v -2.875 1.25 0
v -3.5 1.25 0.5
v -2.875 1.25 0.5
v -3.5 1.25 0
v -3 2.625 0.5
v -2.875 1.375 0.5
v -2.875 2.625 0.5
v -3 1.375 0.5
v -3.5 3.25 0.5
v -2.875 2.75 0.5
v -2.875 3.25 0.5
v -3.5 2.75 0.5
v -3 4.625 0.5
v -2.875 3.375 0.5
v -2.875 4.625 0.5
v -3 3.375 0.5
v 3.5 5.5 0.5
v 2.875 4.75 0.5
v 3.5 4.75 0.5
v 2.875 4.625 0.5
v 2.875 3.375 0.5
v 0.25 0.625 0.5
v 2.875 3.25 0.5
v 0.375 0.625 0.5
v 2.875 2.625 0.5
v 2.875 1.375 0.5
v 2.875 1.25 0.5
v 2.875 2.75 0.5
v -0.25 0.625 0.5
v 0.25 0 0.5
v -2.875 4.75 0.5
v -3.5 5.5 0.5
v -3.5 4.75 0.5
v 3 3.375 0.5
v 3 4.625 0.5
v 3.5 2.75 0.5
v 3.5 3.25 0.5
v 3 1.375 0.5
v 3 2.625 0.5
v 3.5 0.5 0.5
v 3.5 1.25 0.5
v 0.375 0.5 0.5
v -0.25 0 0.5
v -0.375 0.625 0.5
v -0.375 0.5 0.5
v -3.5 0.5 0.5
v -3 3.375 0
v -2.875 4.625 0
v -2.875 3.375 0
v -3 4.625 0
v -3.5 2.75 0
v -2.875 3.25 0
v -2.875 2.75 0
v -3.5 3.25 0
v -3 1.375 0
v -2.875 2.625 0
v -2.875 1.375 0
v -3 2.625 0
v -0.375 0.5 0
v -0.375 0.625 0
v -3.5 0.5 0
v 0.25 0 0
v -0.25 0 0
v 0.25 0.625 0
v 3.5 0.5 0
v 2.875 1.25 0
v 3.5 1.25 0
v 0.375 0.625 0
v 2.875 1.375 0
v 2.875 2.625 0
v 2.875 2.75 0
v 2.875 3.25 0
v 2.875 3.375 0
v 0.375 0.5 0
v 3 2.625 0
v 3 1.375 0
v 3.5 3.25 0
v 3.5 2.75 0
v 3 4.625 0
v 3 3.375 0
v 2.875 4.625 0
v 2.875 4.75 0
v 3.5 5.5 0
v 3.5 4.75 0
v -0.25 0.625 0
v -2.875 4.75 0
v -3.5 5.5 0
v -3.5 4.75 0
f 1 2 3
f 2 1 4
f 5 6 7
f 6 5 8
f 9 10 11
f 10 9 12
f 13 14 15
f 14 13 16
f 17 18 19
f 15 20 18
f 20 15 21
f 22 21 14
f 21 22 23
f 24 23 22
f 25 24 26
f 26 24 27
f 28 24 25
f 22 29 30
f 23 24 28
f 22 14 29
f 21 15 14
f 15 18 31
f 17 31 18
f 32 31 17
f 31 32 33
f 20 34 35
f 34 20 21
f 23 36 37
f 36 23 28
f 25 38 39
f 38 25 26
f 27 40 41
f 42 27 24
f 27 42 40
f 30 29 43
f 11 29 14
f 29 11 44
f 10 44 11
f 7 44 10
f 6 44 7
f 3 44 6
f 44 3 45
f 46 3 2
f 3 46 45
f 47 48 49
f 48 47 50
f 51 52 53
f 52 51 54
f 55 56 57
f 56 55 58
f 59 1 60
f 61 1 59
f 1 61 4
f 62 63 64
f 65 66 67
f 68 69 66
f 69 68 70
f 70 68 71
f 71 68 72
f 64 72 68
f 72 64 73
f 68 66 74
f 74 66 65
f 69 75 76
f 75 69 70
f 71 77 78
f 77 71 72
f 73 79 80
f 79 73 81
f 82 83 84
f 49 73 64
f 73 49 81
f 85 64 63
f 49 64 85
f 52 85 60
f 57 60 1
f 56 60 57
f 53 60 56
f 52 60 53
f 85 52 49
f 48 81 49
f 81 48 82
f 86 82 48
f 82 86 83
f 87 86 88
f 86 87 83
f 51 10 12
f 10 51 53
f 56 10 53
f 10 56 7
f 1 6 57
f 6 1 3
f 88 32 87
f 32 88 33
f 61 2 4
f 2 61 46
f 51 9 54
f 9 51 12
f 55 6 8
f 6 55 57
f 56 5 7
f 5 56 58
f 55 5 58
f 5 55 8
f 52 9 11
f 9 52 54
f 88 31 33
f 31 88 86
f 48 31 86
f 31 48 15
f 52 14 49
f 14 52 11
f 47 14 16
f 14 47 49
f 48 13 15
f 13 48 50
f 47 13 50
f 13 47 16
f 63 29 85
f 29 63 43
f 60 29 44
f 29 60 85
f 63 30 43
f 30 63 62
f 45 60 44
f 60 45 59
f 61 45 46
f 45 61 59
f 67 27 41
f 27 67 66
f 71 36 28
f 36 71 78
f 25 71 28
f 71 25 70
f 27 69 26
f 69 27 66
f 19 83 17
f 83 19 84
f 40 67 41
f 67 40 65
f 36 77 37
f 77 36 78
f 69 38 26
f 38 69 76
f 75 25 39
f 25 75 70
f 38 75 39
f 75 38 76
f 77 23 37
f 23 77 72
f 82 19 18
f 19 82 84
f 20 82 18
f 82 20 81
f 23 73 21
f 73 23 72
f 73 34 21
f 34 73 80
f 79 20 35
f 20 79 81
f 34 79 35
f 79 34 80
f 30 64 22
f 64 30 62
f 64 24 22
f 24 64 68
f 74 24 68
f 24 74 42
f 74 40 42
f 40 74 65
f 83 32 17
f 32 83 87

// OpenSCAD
// file: modus.scad
//Corner Joint - allows the sides of two parts to create inlayed corner. Aids with welding.
//need to verify module math is the same throughout all parts.

module cornerjoint(Z,L,H,EndGap,PadL,PadH,CJangle,CJcenter){
    //change so that H = Z of inlayed part (usually 0.5)
    //add center and angle in degrees option, orgin far side of cut out area

     if((CJangle==0)&&(CJcenter==0))
      {    
        translate([0,0,0])
        rotate([0,0,CJangle])
        difference(){
        cube([L,H+PadH,Z]);
        translate([EndGap,H,0])
        cube([PadL,PadH,Z]);
        translate([L-EndGap-PadL,H,0])
        cube([PadL,PadH,Z]);}
      }    
else if((CJangle==90)&&(CJcenter==0))
      {    
        translate([H+PadH,0,0])
        rotate([0,0,CJangle])
        difference(){
        cube([L,H+PadH,Z]);
        translate([EndGap,H,0])
        cube([PadL,PadH,Z]);
        translate([L-EndGap-PadL,H,0])
        cube([PadL,PadH,Z]);}
      }
else if((CJangle==180)&&(CJcenter==0))       
      {    
        translate([L,H+PadH,0])
        rotate([0,0,CJangle])
        difference(){
        cube([L,H+PadH,Z]);
        translate([EndGap,H,0])
        cube([PadL,PadH,Z]);
        translate([L-EndGap-PadL,H,0])
        cube([PadL,PadH,Z]);}
      }
else if((CJangle==270)&&(CJcenter==0))
      {    
        translate([0,L,0])
        rotate([0,0,CJangle])
        difference(){
        cube([L,H+PadH,Z]);
        translate([EndGap,H,0])
        cube([PadL,PadH,Z]);
        translate([L-EndGap-PadL,H,0])
        cube([PadL,PadH,Z]);}
      }  
      
//centered     
   
else if((CJangle==0)&&(CJcenter==1))
      {    
        translate([-L/2,0,0])
        rotate([0,0,CJangle])
        difference(){
        cube([L,H+PadH,Z]);
        translate([EndGap,H,0])
        cube([PadL,PadH,Z]);
        translate([L-EndGap-PadL,H,0])
        cube([PadL,PadH,Z]);}
      }  
else if((CJangle==90)&&(CJcenter==1))
      {    
        translate([0,-L/2,0])
        rotate([0,0,CJangle])
        difference(){
        cube([L,H+PadH,Z]);
        translate([EndGap,H,0])
        cube([PadL,PadH,Z]);
        translate([L-EndGap-PadL,H,0])
        cube([PadL,PadH,Z]);}
      }
else if((CJangle==180)&&(CJcenter==1))       
      {    
        translate([L/2,0,0])
        rotate([0,0,CJangle])
        difference(){
        cube([L,H+PadH,Z]);
        translate([EndGap,H,0])
        cube([PadL,PadH,Z]);
        translate([L-EndGap-PadL,H,0])
        cube([PadL,PadH,Z]);}
      }
else if((CJangle==270)&&(CJcenter==1))
      {    
        translate([0,L/2,0])
        rotate([0,0,CJangle])
        difference(){
        cube([L,H+PadH,Z]);
        translate([EndGap,H,0])
        cube([PadL,PadH,Z]);
        translate([L-EndGap-PadL,H,0])
        cube([PadL,PadH,Z]);}
      }
} //end cornerjoint module

//Tab Insert - used to cut a hole for an abutting part to insert into. Typically aids with welding the two parts.
module tabinsert(X,Y,Z,dGap,cGap,c1,c2,c3,c4,c5,c6,c7,c8,center){
    translate([-dGap-(center*(X/2)),-dGap-(center*(Y/2)),0]){
        //main cut
        cube([X+(dGap*2),Y+(dGap*2),Z]);
        //corner c1c2
        translate([-cGap,(Y+(dGap*2))-c1+cGap,0])
            {
        cube([c2,c1,Z]);}
       //corner c3c4
       translate([(X+(dGap*2))-c3+cGap,(Y+(dGap*2))-c4+cGap,0]){
           cube([c3,c4,Z]);
       }
       //corner c5c6
       translate([(X+(dGap*2))-c6+cGap,-cGap,0])
      {
          cube([c6,c5,Z]);
      }
       
       //corner c7c8 
       translate([-cGap,-cGap,0]){
           cube([c7,c8,Z]);
       }
    
    } //end center translate
} //end tabinsert module
 
// file: vars.scad
brickW=6; 
brickL=12;
brickCH=6;

$fn=8; //defines resolution of circles. 8 is okay for review. 100  or greater should be used for for final dxf export.

dZstandard=0.5; //thickness of steel to be cut for drawer parts
fZstandard=0.5;
aZstandard=0.5; //thickness of steel to be cut for arm parts

fBOLTHOLEstandardD=1; //standard bolts used on frame
sliderodholeOD=1.2; 

dGap=0.03125; //gap between a hole cut's edge and the part sitting within the hole. //D3 appears to use 0.3125, is this in error?

//all parts set to standard thickness below
//off standard preferences can be defined below

//drawer
drawergap=0.0283;  //extra room for drawer to slide in the space between f1 and f4
drawerHgap=0.1884;  //total extra space from drawer sides to frame walls. sum of both sides.

d1z=dZstandard;
d2z=dZstandard;
d3z=dZstandard;
d4z=dZstandard;
d5z=dZstandard;
d6z=dZstandard;
d5z=dZstandard;
d7z=dZstandard;
d8z=dZstandard;
d9z=dZstandard;

//frame
f1x=24.2;
f1y=6;
f1z=0.5;


f2y=3.5;
f2z=fZstandard;

f3x=f1x;
f3y=3.5;
f3z=fZstandard;

f4y=11;
f4z=fZstandard;

f5y=3.5;
f5z=fZstandard;

f6y=8;
f6z=fZstandard;

f8y=brickW;
f8z=fZstandard;
f8boltD=1;

f9y=4.5;
f9x=43.5;  //set based on MAINcylinder
f9z=fZstandard;

f8x=f9x;

f11x=1.25;
f11z=fZstandard;

f13z=fZstandard;

//arms

a1x=4;
a1y=72; //calculate based on drawer cylinder
a1z=aZstandard;

a2x=6;
a2y=72;  //calculate based on drawer cylinder
a2z=aZstandard;

a4z=aZstandard;
a6z=aZstandard;

//
//Input your main cylinder's dimenions here
//
cylinderMAINminC2E=0; //main hydraulic cylinder's distance from center of mounting hole to the end of the shaft when fully compressed.
cylinderMAINmaxC2E=0; //main hydraulic cylinder's distance from center of mounting hole to the end of the shaft when fully extended.

//
//Input your drawer cylinder's dimenions here
//
cylinderDRAWERbodyH=3; //measured when in position, largest length from top to bottom of cylinder
cylinderDRAWERminC2C=0; //drawer's hydraulic cylinder's distance from the center of one mounting hole to the center of the other when fully compressed.
cylinderDRAWERmaxC2C=0; ///drawer's hydraulic cylinder's distance from the center of one mounting hole to the center of the other when fully extended.
cylinderDRAWERrodclevisW=2.5; //width of cylinders' clevis on end of rod
cylinderDRAWERrodclevisID=1;
cylinderDRAWERrodclevisOD=2;
cylinderDRAWERrearclevisW=2.5; //width of mounting clevis cylinder body
cylinderDRAWERrearclevisID=1;
cylinderDRAWERrearclevisOD=2;
cylinderDRAWERrearclevisClearance=3; //usable space around rear clevis pin (in diameter). be aware of hyraulic fittings.

//the following variables are calculated in order of dependence on preceding variables
d3x=brickL+(d2z*2);
d3y=brickCH-d1z;
d4x=brickW+d3z+d3z;
d4y=brickCH-d1z;
d5x=brickL+(d2z*2);
d5y=brickW;
d6x=brickL+(d2z*2);
d6y=brickCH;
d7x=cylinderDRAWERrearclevisClearance;
d7y=a4z+d8z+cylinderDRAWERbodyH;
d9x=cylinderDRAWERbodyH+d6z;
d9y=cylinderDRAWERbodyH+d8z;
d8x=brickL+(d2z*2);
d8y=max(5,(d9x-d6z));   //need to review fundamentals, 5 minimun unless d9 gets larger than d8
d1x=18.5;   //need to come up with a formula
d1y=18;     //need to come up with a formula
d2x=d8y+d6z+brickW+d3z+d5y+d3z;
d2y=brickCH;

f11y=f8y;
f6x=brickL+(d2z*2)+(f9y*2)+drawerHgap;
f8x=43.5;  //need to define based on MAINcylinder inputs


f2x=brickL+(d2z*2)+drawerHgap+(f9y*2)-(1.4*2);  //distance between large cut outs in f9

f5x=brickL+(d2z*2)+drawerHgap+(f9y*2)+(a1x*2); //distance between outer edges of each A1

f4x=f5x-0.5;   //same as f5 but minus 0.25 on each side to give a little overhang
// main file
include <vars.scad>;
use <modus.scad>;

d4p();

module d4p(){

difference(){
translate([-(d4x/2),0,0])
cube([d4x,d4y,d4z]);
translate([-(d4x/2),0,0])
cuts();
translate([(d4x/2),0,0])
mirror([1,0,0])
cuts();
} //end difference
module cuts(){
    translate([0,d5z+0.75,0])
    cornerjoint(d4z,(d4y-(0.75*2)-0.5-d5z)/2,d3z,0.125,((d4y-(0.75*2)-0.5-d5z)/2)-(0.125*2),0.125,270,0);
    
    translate([0,d4y-0.75-((d4y-(0.75*2)-0.5-d5z)/2),0])
    cornerjoint(d4z,(d4y-(0.75*2)-0.5-d5z)/2,d3z,0.125,((d4y-(0.75*2)-0.5-d5z)/2)-(0.125*2),0.125,270,0);

    translate([-0.125,0,0])
    cornerjoint(d4z,((d4x-0.5)/2)+(0.125),d5z,0.125,((d4x-0.5)/2)-0.125,0.125,0,0);
} //end cut module

} //end d4p module
